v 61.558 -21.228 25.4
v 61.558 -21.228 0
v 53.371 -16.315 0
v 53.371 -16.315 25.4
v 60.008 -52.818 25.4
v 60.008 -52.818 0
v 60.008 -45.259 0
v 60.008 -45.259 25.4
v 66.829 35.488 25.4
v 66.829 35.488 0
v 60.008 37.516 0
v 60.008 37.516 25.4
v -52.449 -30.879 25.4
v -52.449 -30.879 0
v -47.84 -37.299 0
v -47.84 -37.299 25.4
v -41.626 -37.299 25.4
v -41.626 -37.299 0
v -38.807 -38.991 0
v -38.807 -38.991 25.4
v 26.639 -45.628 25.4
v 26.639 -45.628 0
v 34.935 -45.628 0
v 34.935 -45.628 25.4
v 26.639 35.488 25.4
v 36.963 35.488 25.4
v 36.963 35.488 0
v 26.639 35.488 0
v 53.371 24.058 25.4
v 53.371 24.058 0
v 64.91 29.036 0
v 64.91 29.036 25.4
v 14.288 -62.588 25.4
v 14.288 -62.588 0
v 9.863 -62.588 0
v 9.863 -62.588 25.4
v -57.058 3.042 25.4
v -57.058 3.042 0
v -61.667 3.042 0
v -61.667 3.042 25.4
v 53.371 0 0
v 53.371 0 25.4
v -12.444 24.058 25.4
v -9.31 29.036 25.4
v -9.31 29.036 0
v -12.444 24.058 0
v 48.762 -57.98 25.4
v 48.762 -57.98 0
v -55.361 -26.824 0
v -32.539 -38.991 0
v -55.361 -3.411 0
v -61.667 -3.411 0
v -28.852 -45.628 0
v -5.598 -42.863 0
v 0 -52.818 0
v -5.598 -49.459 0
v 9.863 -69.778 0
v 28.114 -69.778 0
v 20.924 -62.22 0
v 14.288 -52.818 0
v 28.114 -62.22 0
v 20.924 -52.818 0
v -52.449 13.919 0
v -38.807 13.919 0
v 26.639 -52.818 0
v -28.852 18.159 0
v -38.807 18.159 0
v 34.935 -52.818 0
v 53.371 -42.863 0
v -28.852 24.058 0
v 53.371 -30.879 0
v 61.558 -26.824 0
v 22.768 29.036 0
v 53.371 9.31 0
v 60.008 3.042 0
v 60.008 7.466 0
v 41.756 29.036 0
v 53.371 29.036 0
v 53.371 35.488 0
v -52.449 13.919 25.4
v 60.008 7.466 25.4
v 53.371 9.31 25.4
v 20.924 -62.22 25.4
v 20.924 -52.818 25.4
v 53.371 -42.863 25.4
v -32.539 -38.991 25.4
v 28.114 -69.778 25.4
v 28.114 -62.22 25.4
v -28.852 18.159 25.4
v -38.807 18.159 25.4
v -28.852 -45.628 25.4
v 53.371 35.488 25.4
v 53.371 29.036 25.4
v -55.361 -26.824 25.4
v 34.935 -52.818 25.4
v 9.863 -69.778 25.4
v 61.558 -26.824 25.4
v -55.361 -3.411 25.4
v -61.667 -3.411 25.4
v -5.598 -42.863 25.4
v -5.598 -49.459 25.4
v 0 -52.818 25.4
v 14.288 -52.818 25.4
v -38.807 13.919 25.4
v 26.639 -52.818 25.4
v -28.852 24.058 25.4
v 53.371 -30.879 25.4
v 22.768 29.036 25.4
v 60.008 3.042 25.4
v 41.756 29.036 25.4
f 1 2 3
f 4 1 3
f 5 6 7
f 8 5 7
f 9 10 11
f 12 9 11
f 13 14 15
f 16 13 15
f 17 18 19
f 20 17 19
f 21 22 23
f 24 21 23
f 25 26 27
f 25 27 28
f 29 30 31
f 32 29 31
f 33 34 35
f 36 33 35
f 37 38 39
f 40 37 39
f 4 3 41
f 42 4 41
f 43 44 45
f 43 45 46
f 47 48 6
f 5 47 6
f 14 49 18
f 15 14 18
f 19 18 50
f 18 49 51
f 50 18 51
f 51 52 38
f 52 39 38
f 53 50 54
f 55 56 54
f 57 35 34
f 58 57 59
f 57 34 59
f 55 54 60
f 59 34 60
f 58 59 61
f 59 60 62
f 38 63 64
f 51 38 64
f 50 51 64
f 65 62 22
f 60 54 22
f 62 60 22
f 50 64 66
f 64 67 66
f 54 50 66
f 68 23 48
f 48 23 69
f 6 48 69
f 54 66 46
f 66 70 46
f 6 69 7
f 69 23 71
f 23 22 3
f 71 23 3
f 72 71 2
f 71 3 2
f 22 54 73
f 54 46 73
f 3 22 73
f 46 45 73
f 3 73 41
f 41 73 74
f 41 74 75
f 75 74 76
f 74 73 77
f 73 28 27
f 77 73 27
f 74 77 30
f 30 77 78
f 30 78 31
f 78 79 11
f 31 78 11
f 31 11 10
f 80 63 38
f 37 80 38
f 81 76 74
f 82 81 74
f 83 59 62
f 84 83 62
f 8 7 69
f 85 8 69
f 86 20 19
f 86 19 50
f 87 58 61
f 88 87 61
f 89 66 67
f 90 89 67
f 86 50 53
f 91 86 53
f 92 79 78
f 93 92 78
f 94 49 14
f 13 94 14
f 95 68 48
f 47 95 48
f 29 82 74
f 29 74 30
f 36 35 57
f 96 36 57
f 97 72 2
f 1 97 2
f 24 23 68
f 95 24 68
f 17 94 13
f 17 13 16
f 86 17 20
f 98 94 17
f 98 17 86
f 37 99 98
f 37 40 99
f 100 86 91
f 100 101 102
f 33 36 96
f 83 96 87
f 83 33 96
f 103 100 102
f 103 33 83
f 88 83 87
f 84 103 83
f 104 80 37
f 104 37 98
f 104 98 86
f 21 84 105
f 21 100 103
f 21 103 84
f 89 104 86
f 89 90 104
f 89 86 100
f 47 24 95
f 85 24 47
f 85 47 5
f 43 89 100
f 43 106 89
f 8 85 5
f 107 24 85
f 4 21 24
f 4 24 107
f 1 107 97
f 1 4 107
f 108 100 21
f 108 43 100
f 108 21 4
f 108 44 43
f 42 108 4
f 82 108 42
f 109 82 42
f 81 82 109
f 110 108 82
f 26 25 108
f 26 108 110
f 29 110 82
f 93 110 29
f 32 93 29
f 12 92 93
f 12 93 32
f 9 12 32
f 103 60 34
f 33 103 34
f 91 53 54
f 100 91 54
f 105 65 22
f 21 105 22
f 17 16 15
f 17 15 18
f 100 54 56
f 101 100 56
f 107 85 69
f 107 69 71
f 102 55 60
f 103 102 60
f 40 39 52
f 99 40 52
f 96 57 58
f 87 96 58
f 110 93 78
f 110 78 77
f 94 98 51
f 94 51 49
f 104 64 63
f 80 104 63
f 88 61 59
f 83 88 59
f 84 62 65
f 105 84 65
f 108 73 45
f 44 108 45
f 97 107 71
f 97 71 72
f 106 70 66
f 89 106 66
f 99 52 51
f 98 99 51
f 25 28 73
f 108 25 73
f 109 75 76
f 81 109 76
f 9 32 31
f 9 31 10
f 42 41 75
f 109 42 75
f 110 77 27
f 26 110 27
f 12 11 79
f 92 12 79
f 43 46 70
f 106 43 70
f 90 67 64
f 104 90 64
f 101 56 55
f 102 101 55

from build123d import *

# Parameters (mm, degrees)
F1_DEPTH = 25.4


with BuildPart() as f1:
    # F0 (on Top) → F1 (new body)
    with BuildSketch(Plane.XY):
        Polygon((-61.666694, -3.410565), (-55.360642, -3.410565), (-55.360642, -26.823629), (-52.448954, -30.879436), (-47.840081, -37.299322), (-41.626241, -37.299322), (-38.806695, -38.991049), (-32.53863, -38.991049), (-28.851533, -45.627825), (-5.598422, -42.862501), (-5.598422, -49.458609), (0, -52.817661), (14.2875, -52.817661), (14.2875, -62.588468), (9.862985, -62.588468), (9.862985, -69.778308), (28.114116, -69.778308), (28.114116, -62.219758), (20.924276, -62.219758), (20.924276, -52.817661), (26.639272, -52.817661), (26.639272, -45.627825), (34.93524, -45.627825), (34.93524, -52.817661), (48.761852, -57.979599), (60.007501, -52.817661), (60.007501, -45.259114), (53.370729, -42.862501), (53.370729, -30.879436), (61.558252, -26.823629), (61.558252, -21.227917), (53.370729, -16.315404), (53.370729, 0), (60.007501, 3.041855), (60.007501, 7.466371), (53.370729, 9.30992), (53.370729, 24.058307), (64.910345, 29.035889), (66.828631, 35.488307), (60.007501, 37.51621), (53.370729, 35.488307), (53.370729, 29.035889), (41.756369, 29.035889), (36.963142, 35.488307), (26.639272, 35.488307), (22.767821, 29.035889), (-9.30992, 29.035889), (-12.443951, 24.058307), (-28.851533, 24.058307), (-28.851533, 18.158952), (-38.806695, 18.158952), (-38.806695, 13.91879), (-52.448954, 13.91879), (-57.057824, 3.041855), (-61.666694, 3.041855), (-61.666694, 0), align=None)
    extrude(amount=F1_DEPTH)


solid = f1.part
